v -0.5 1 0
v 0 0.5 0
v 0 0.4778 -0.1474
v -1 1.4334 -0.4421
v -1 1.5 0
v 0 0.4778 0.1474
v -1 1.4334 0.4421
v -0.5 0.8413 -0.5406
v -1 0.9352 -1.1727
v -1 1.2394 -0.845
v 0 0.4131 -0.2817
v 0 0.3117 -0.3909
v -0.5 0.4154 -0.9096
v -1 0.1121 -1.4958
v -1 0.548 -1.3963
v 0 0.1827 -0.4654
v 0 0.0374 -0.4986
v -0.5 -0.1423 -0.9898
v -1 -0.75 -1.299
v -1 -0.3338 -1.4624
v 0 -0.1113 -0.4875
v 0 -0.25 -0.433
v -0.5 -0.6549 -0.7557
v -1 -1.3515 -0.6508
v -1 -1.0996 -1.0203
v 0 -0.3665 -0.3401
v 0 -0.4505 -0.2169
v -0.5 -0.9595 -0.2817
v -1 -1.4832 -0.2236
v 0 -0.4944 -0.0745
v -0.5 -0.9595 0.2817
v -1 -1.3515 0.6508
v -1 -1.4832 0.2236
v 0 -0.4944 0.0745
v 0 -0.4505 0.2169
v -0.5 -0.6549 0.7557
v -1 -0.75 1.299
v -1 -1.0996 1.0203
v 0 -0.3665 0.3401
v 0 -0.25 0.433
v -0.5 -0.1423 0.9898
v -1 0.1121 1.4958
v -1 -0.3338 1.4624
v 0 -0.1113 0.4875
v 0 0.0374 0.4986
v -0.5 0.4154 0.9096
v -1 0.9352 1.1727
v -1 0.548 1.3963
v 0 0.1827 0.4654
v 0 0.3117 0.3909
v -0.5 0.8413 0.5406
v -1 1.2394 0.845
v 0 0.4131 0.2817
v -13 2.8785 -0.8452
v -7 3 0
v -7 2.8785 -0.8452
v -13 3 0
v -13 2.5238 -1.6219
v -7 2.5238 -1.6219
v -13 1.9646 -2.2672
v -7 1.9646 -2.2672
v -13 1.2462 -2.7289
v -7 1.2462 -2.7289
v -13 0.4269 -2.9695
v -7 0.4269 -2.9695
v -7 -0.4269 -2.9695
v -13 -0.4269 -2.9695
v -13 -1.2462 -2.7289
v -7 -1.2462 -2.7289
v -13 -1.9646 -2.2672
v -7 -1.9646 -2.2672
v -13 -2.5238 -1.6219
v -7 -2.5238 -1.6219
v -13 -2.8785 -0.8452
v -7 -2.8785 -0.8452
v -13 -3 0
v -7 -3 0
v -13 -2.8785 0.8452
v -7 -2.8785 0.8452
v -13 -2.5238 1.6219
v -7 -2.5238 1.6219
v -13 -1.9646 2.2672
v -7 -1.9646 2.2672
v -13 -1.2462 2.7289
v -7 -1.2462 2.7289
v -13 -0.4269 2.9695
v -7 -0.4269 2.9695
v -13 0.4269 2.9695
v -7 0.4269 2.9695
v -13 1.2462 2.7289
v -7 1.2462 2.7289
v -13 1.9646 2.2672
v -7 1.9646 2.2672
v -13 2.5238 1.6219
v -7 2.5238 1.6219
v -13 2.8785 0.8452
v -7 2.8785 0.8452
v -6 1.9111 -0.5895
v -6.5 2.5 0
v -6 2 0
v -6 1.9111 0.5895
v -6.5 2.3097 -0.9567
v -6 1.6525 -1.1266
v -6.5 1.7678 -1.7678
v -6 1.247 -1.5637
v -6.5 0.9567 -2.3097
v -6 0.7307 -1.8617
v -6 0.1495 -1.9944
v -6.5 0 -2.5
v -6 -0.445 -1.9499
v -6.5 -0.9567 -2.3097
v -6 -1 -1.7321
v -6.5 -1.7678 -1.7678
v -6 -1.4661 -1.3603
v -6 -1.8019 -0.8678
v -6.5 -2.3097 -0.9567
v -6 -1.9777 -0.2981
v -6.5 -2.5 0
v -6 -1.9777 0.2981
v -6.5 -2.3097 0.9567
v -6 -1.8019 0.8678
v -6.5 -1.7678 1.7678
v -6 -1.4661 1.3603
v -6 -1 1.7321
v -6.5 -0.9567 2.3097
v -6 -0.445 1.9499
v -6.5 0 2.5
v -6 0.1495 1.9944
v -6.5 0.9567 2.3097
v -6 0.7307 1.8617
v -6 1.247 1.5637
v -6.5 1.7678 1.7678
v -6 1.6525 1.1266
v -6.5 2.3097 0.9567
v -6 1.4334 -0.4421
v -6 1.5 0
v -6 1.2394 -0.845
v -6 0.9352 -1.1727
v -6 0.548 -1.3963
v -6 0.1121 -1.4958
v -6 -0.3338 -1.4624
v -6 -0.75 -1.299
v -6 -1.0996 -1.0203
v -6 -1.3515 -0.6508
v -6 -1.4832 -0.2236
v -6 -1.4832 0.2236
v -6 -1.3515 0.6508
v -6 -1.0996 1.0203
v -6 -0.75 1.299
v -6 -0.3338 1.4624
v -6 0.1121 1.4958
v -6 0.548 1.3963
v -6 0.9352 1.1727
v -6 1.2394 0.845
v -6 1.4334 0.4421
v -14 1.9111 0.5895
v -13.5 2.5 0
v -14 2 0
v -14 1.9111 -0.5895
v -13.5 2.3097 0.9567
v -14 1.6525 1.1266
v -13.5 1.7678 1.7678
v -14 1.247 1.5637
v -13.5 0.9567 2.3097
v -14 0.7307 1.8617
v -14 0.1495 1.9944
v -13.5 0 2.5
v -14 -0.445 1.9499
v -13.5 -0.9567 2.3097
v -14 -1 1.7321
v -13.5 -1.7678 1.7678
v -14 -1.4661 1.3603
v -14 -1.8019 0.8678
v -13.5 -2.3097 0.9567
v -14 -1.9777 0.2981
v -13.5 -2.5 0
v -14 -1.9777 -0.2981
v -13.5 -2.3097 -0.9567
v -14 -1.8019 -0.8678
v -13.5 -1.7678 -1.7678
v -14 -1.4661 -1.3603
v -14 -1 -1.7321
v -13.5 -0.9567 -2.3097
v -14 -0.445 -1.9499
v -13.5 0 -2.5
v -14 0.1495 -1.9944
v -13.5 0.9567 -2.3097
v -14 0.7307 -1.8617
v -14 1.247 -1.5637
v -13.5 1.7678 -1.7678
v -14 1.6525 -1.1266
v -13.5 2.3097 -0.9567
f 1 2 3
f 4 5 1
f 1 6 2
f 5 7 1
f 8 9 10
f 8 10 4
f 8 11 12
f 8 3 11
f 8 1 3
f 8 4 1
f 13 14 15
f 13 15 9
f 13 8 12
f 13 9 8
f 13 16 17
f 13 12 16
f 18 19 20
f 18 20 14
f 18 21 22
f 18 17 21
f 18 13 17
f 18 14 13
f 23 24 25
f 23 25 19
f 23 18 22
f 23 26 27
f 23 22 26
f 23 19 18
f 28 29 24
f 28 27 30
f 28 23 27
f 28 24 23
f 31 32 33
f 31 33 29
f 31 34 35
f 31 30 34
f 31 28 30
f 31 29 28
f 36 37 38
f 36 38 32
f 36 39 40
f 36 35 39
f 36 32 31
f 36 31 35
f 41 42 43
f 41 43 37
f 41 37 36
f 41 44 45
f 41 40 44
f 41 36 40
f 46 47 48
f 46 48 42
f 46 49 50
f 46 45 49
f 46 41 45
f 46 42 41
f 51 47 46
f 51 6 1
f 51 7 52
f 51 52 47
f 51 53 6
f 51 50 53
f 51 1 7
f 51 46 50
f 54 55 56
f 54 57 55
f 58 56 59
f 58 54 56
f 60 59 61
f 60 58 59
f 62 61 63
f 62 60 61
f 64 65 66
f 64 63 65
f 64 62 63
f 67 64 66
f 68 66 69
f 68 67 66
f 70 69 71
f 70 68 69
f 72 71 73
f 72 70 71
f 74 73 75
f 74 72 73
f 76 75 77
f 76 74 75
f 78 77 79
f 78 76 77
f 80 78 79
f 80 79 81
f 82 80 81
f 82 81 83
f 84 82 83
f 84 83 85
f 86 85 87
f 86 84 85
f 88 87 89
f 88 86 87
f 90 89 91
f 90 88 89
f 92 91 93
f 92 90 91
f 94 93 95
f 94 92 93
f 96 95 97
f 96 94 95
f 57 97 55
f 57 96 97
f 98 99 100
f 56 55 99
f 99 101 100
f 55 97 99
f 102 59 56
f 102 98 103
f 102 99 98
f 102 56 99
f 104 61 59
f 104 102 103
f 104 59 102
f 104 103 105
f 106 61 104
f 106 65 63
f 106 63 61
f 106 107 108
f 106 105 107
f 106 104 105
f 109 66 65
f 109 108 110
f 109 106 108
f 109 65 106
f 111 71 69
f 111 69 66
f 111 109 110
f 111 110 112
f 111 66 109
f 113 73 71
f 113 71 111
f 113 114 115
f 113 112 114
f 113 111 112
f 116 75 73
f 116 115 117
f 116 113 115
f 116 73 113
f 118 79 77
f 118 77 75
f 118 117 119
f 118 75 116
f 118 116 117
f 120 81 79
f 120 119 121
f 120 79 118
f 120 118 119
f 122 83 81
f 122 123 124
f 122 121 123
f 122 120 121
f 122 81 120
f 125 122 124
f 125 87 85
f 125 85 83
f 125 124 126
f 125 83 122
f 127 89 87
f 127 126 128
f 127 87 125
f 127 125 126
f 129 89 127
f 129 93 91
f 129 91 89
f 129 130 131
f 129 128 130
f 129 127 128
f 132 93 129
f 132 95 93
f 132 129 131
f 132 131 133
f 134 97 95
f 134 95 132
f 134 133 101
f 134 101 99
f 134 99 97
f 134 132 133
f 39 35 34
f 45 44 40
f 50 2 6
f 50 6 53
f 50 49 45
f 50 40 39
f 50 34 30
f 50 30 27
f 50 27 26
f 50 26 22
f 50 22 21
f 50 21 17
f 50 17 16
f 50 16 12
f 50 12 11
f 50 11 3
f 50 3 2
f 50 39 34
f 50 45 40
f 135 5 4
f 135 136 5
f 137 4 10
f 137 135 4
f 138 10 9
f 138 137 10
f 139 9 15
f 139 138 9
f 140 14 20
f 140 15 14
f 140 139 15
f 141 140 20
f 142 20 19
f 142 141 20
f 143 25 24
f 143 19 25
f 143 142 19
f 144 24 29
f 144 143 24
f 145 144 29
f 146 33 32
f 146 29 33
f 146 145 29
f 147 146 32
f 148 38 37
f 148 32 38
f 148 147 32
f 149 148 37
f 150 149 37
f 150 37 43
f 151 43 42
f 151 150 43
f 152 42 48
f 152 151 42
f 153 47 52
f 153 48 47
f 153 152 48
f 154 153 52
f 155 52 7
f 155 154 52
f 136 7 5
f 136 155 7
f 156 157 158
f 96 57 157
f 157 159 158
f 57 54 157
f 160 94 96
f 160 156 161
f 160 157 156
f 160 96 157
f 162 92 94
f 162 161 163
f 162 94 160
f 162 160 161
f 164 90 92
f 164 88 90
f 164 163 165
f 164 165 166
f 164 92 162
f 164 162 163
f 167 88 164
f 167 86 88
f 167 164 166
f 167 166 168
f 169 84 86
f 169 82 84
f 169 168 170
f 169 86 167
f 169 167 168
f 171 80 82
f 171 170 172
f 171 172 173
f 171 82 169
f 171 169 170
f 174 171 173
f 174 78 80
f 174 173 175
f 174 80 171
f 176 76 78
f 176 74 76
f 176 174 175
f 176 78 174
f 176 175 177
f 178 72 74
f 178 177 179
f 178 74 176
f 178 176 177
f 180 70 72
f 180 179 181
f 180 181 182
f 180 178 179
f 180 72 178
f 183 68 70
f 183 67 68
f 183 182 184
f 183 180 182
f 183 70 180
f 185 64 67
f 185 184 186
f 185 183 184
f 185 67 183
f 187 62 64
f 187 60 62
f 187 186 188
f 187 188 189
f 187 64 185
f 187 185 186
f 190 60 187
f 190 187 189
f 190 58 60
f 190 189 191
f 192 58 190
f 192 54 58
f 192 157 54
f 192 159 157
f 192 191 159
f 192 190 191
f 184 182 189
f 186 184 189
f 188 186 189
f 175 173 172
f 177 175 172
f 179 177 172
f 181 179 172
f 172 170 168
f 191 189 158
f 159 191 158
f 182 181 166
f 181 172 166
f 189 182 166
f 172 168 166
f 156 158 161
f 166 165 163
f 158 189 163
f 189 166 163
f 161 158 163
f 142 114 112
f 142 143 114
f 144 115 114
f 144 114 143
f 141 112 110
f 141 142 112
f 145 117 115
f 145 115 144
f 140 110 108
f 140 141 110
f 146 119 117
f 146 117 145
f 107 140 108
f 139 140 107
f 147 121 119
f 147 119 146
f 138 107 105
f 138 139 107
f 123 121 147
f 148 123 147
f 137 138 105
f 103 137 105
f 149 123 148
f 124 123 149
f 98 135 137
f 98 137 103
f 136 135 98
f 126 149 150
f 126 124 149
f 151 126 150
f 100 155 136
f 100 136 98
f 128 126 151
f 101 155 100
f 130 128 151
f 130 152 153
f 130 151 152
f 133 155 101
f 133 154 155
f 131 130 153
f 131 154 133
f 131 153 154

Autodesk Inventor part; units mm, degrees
ref_plane "YZ Plane" through (0, 0, 0) normal (1, 0, 0) x (0, 1, 0)
ref_plane "XZ Plane" through (0, 0, 0) normal (0, 1, 0) x (-1, 0, 0)
ref_plane "XY Plane" through (0, 0, 0) normal (0, 0, 1) x (1, 0, 0)
sketch "Skizze1" plane through (0, 0, 0) normal (0, 0, 1) x (1, 0, 0)
  line L0 (-16.8, 0) -> (2.8, 0) projected
  line L1 (0, -0.6) -> (0, 3.6) projected
  line L2 (0, 1.5) -> (-6, 1.5)
  line L3 (-6, 1.5) -> (-6, 3)
  line L4 (-6, 3) -> (-14, 3)
  line L5 (-14, 3) -> (-14, 0)
  line L6 (-14, 0) -> (0, 0)
  line L7 (0, 0) -> (0, 1.5)
  dimension "d0" = 3
  dimension "d1" = 6
  dimension "d2" = 6
  dimension "d3" = 8
revolve "Umdrehung1" add sketch "Skizze1" angle 360 about axis through (-10, 0, 0) along (1, 0, 0)
thread "Gewinde1" size "M3x0.5" class "6g" standard "ANSI Metric M Profile" full length
thread "Gewinde2" size "M1x0.25" class "6g" standard "ANSI Metric M Profile" full length
chamfer "Fase1" distance 1 angle 45 3 edges at (-14, -3, 0) (-6, -3, 0) (0, -1.5, 0)
properties part number "13_1087_017"
